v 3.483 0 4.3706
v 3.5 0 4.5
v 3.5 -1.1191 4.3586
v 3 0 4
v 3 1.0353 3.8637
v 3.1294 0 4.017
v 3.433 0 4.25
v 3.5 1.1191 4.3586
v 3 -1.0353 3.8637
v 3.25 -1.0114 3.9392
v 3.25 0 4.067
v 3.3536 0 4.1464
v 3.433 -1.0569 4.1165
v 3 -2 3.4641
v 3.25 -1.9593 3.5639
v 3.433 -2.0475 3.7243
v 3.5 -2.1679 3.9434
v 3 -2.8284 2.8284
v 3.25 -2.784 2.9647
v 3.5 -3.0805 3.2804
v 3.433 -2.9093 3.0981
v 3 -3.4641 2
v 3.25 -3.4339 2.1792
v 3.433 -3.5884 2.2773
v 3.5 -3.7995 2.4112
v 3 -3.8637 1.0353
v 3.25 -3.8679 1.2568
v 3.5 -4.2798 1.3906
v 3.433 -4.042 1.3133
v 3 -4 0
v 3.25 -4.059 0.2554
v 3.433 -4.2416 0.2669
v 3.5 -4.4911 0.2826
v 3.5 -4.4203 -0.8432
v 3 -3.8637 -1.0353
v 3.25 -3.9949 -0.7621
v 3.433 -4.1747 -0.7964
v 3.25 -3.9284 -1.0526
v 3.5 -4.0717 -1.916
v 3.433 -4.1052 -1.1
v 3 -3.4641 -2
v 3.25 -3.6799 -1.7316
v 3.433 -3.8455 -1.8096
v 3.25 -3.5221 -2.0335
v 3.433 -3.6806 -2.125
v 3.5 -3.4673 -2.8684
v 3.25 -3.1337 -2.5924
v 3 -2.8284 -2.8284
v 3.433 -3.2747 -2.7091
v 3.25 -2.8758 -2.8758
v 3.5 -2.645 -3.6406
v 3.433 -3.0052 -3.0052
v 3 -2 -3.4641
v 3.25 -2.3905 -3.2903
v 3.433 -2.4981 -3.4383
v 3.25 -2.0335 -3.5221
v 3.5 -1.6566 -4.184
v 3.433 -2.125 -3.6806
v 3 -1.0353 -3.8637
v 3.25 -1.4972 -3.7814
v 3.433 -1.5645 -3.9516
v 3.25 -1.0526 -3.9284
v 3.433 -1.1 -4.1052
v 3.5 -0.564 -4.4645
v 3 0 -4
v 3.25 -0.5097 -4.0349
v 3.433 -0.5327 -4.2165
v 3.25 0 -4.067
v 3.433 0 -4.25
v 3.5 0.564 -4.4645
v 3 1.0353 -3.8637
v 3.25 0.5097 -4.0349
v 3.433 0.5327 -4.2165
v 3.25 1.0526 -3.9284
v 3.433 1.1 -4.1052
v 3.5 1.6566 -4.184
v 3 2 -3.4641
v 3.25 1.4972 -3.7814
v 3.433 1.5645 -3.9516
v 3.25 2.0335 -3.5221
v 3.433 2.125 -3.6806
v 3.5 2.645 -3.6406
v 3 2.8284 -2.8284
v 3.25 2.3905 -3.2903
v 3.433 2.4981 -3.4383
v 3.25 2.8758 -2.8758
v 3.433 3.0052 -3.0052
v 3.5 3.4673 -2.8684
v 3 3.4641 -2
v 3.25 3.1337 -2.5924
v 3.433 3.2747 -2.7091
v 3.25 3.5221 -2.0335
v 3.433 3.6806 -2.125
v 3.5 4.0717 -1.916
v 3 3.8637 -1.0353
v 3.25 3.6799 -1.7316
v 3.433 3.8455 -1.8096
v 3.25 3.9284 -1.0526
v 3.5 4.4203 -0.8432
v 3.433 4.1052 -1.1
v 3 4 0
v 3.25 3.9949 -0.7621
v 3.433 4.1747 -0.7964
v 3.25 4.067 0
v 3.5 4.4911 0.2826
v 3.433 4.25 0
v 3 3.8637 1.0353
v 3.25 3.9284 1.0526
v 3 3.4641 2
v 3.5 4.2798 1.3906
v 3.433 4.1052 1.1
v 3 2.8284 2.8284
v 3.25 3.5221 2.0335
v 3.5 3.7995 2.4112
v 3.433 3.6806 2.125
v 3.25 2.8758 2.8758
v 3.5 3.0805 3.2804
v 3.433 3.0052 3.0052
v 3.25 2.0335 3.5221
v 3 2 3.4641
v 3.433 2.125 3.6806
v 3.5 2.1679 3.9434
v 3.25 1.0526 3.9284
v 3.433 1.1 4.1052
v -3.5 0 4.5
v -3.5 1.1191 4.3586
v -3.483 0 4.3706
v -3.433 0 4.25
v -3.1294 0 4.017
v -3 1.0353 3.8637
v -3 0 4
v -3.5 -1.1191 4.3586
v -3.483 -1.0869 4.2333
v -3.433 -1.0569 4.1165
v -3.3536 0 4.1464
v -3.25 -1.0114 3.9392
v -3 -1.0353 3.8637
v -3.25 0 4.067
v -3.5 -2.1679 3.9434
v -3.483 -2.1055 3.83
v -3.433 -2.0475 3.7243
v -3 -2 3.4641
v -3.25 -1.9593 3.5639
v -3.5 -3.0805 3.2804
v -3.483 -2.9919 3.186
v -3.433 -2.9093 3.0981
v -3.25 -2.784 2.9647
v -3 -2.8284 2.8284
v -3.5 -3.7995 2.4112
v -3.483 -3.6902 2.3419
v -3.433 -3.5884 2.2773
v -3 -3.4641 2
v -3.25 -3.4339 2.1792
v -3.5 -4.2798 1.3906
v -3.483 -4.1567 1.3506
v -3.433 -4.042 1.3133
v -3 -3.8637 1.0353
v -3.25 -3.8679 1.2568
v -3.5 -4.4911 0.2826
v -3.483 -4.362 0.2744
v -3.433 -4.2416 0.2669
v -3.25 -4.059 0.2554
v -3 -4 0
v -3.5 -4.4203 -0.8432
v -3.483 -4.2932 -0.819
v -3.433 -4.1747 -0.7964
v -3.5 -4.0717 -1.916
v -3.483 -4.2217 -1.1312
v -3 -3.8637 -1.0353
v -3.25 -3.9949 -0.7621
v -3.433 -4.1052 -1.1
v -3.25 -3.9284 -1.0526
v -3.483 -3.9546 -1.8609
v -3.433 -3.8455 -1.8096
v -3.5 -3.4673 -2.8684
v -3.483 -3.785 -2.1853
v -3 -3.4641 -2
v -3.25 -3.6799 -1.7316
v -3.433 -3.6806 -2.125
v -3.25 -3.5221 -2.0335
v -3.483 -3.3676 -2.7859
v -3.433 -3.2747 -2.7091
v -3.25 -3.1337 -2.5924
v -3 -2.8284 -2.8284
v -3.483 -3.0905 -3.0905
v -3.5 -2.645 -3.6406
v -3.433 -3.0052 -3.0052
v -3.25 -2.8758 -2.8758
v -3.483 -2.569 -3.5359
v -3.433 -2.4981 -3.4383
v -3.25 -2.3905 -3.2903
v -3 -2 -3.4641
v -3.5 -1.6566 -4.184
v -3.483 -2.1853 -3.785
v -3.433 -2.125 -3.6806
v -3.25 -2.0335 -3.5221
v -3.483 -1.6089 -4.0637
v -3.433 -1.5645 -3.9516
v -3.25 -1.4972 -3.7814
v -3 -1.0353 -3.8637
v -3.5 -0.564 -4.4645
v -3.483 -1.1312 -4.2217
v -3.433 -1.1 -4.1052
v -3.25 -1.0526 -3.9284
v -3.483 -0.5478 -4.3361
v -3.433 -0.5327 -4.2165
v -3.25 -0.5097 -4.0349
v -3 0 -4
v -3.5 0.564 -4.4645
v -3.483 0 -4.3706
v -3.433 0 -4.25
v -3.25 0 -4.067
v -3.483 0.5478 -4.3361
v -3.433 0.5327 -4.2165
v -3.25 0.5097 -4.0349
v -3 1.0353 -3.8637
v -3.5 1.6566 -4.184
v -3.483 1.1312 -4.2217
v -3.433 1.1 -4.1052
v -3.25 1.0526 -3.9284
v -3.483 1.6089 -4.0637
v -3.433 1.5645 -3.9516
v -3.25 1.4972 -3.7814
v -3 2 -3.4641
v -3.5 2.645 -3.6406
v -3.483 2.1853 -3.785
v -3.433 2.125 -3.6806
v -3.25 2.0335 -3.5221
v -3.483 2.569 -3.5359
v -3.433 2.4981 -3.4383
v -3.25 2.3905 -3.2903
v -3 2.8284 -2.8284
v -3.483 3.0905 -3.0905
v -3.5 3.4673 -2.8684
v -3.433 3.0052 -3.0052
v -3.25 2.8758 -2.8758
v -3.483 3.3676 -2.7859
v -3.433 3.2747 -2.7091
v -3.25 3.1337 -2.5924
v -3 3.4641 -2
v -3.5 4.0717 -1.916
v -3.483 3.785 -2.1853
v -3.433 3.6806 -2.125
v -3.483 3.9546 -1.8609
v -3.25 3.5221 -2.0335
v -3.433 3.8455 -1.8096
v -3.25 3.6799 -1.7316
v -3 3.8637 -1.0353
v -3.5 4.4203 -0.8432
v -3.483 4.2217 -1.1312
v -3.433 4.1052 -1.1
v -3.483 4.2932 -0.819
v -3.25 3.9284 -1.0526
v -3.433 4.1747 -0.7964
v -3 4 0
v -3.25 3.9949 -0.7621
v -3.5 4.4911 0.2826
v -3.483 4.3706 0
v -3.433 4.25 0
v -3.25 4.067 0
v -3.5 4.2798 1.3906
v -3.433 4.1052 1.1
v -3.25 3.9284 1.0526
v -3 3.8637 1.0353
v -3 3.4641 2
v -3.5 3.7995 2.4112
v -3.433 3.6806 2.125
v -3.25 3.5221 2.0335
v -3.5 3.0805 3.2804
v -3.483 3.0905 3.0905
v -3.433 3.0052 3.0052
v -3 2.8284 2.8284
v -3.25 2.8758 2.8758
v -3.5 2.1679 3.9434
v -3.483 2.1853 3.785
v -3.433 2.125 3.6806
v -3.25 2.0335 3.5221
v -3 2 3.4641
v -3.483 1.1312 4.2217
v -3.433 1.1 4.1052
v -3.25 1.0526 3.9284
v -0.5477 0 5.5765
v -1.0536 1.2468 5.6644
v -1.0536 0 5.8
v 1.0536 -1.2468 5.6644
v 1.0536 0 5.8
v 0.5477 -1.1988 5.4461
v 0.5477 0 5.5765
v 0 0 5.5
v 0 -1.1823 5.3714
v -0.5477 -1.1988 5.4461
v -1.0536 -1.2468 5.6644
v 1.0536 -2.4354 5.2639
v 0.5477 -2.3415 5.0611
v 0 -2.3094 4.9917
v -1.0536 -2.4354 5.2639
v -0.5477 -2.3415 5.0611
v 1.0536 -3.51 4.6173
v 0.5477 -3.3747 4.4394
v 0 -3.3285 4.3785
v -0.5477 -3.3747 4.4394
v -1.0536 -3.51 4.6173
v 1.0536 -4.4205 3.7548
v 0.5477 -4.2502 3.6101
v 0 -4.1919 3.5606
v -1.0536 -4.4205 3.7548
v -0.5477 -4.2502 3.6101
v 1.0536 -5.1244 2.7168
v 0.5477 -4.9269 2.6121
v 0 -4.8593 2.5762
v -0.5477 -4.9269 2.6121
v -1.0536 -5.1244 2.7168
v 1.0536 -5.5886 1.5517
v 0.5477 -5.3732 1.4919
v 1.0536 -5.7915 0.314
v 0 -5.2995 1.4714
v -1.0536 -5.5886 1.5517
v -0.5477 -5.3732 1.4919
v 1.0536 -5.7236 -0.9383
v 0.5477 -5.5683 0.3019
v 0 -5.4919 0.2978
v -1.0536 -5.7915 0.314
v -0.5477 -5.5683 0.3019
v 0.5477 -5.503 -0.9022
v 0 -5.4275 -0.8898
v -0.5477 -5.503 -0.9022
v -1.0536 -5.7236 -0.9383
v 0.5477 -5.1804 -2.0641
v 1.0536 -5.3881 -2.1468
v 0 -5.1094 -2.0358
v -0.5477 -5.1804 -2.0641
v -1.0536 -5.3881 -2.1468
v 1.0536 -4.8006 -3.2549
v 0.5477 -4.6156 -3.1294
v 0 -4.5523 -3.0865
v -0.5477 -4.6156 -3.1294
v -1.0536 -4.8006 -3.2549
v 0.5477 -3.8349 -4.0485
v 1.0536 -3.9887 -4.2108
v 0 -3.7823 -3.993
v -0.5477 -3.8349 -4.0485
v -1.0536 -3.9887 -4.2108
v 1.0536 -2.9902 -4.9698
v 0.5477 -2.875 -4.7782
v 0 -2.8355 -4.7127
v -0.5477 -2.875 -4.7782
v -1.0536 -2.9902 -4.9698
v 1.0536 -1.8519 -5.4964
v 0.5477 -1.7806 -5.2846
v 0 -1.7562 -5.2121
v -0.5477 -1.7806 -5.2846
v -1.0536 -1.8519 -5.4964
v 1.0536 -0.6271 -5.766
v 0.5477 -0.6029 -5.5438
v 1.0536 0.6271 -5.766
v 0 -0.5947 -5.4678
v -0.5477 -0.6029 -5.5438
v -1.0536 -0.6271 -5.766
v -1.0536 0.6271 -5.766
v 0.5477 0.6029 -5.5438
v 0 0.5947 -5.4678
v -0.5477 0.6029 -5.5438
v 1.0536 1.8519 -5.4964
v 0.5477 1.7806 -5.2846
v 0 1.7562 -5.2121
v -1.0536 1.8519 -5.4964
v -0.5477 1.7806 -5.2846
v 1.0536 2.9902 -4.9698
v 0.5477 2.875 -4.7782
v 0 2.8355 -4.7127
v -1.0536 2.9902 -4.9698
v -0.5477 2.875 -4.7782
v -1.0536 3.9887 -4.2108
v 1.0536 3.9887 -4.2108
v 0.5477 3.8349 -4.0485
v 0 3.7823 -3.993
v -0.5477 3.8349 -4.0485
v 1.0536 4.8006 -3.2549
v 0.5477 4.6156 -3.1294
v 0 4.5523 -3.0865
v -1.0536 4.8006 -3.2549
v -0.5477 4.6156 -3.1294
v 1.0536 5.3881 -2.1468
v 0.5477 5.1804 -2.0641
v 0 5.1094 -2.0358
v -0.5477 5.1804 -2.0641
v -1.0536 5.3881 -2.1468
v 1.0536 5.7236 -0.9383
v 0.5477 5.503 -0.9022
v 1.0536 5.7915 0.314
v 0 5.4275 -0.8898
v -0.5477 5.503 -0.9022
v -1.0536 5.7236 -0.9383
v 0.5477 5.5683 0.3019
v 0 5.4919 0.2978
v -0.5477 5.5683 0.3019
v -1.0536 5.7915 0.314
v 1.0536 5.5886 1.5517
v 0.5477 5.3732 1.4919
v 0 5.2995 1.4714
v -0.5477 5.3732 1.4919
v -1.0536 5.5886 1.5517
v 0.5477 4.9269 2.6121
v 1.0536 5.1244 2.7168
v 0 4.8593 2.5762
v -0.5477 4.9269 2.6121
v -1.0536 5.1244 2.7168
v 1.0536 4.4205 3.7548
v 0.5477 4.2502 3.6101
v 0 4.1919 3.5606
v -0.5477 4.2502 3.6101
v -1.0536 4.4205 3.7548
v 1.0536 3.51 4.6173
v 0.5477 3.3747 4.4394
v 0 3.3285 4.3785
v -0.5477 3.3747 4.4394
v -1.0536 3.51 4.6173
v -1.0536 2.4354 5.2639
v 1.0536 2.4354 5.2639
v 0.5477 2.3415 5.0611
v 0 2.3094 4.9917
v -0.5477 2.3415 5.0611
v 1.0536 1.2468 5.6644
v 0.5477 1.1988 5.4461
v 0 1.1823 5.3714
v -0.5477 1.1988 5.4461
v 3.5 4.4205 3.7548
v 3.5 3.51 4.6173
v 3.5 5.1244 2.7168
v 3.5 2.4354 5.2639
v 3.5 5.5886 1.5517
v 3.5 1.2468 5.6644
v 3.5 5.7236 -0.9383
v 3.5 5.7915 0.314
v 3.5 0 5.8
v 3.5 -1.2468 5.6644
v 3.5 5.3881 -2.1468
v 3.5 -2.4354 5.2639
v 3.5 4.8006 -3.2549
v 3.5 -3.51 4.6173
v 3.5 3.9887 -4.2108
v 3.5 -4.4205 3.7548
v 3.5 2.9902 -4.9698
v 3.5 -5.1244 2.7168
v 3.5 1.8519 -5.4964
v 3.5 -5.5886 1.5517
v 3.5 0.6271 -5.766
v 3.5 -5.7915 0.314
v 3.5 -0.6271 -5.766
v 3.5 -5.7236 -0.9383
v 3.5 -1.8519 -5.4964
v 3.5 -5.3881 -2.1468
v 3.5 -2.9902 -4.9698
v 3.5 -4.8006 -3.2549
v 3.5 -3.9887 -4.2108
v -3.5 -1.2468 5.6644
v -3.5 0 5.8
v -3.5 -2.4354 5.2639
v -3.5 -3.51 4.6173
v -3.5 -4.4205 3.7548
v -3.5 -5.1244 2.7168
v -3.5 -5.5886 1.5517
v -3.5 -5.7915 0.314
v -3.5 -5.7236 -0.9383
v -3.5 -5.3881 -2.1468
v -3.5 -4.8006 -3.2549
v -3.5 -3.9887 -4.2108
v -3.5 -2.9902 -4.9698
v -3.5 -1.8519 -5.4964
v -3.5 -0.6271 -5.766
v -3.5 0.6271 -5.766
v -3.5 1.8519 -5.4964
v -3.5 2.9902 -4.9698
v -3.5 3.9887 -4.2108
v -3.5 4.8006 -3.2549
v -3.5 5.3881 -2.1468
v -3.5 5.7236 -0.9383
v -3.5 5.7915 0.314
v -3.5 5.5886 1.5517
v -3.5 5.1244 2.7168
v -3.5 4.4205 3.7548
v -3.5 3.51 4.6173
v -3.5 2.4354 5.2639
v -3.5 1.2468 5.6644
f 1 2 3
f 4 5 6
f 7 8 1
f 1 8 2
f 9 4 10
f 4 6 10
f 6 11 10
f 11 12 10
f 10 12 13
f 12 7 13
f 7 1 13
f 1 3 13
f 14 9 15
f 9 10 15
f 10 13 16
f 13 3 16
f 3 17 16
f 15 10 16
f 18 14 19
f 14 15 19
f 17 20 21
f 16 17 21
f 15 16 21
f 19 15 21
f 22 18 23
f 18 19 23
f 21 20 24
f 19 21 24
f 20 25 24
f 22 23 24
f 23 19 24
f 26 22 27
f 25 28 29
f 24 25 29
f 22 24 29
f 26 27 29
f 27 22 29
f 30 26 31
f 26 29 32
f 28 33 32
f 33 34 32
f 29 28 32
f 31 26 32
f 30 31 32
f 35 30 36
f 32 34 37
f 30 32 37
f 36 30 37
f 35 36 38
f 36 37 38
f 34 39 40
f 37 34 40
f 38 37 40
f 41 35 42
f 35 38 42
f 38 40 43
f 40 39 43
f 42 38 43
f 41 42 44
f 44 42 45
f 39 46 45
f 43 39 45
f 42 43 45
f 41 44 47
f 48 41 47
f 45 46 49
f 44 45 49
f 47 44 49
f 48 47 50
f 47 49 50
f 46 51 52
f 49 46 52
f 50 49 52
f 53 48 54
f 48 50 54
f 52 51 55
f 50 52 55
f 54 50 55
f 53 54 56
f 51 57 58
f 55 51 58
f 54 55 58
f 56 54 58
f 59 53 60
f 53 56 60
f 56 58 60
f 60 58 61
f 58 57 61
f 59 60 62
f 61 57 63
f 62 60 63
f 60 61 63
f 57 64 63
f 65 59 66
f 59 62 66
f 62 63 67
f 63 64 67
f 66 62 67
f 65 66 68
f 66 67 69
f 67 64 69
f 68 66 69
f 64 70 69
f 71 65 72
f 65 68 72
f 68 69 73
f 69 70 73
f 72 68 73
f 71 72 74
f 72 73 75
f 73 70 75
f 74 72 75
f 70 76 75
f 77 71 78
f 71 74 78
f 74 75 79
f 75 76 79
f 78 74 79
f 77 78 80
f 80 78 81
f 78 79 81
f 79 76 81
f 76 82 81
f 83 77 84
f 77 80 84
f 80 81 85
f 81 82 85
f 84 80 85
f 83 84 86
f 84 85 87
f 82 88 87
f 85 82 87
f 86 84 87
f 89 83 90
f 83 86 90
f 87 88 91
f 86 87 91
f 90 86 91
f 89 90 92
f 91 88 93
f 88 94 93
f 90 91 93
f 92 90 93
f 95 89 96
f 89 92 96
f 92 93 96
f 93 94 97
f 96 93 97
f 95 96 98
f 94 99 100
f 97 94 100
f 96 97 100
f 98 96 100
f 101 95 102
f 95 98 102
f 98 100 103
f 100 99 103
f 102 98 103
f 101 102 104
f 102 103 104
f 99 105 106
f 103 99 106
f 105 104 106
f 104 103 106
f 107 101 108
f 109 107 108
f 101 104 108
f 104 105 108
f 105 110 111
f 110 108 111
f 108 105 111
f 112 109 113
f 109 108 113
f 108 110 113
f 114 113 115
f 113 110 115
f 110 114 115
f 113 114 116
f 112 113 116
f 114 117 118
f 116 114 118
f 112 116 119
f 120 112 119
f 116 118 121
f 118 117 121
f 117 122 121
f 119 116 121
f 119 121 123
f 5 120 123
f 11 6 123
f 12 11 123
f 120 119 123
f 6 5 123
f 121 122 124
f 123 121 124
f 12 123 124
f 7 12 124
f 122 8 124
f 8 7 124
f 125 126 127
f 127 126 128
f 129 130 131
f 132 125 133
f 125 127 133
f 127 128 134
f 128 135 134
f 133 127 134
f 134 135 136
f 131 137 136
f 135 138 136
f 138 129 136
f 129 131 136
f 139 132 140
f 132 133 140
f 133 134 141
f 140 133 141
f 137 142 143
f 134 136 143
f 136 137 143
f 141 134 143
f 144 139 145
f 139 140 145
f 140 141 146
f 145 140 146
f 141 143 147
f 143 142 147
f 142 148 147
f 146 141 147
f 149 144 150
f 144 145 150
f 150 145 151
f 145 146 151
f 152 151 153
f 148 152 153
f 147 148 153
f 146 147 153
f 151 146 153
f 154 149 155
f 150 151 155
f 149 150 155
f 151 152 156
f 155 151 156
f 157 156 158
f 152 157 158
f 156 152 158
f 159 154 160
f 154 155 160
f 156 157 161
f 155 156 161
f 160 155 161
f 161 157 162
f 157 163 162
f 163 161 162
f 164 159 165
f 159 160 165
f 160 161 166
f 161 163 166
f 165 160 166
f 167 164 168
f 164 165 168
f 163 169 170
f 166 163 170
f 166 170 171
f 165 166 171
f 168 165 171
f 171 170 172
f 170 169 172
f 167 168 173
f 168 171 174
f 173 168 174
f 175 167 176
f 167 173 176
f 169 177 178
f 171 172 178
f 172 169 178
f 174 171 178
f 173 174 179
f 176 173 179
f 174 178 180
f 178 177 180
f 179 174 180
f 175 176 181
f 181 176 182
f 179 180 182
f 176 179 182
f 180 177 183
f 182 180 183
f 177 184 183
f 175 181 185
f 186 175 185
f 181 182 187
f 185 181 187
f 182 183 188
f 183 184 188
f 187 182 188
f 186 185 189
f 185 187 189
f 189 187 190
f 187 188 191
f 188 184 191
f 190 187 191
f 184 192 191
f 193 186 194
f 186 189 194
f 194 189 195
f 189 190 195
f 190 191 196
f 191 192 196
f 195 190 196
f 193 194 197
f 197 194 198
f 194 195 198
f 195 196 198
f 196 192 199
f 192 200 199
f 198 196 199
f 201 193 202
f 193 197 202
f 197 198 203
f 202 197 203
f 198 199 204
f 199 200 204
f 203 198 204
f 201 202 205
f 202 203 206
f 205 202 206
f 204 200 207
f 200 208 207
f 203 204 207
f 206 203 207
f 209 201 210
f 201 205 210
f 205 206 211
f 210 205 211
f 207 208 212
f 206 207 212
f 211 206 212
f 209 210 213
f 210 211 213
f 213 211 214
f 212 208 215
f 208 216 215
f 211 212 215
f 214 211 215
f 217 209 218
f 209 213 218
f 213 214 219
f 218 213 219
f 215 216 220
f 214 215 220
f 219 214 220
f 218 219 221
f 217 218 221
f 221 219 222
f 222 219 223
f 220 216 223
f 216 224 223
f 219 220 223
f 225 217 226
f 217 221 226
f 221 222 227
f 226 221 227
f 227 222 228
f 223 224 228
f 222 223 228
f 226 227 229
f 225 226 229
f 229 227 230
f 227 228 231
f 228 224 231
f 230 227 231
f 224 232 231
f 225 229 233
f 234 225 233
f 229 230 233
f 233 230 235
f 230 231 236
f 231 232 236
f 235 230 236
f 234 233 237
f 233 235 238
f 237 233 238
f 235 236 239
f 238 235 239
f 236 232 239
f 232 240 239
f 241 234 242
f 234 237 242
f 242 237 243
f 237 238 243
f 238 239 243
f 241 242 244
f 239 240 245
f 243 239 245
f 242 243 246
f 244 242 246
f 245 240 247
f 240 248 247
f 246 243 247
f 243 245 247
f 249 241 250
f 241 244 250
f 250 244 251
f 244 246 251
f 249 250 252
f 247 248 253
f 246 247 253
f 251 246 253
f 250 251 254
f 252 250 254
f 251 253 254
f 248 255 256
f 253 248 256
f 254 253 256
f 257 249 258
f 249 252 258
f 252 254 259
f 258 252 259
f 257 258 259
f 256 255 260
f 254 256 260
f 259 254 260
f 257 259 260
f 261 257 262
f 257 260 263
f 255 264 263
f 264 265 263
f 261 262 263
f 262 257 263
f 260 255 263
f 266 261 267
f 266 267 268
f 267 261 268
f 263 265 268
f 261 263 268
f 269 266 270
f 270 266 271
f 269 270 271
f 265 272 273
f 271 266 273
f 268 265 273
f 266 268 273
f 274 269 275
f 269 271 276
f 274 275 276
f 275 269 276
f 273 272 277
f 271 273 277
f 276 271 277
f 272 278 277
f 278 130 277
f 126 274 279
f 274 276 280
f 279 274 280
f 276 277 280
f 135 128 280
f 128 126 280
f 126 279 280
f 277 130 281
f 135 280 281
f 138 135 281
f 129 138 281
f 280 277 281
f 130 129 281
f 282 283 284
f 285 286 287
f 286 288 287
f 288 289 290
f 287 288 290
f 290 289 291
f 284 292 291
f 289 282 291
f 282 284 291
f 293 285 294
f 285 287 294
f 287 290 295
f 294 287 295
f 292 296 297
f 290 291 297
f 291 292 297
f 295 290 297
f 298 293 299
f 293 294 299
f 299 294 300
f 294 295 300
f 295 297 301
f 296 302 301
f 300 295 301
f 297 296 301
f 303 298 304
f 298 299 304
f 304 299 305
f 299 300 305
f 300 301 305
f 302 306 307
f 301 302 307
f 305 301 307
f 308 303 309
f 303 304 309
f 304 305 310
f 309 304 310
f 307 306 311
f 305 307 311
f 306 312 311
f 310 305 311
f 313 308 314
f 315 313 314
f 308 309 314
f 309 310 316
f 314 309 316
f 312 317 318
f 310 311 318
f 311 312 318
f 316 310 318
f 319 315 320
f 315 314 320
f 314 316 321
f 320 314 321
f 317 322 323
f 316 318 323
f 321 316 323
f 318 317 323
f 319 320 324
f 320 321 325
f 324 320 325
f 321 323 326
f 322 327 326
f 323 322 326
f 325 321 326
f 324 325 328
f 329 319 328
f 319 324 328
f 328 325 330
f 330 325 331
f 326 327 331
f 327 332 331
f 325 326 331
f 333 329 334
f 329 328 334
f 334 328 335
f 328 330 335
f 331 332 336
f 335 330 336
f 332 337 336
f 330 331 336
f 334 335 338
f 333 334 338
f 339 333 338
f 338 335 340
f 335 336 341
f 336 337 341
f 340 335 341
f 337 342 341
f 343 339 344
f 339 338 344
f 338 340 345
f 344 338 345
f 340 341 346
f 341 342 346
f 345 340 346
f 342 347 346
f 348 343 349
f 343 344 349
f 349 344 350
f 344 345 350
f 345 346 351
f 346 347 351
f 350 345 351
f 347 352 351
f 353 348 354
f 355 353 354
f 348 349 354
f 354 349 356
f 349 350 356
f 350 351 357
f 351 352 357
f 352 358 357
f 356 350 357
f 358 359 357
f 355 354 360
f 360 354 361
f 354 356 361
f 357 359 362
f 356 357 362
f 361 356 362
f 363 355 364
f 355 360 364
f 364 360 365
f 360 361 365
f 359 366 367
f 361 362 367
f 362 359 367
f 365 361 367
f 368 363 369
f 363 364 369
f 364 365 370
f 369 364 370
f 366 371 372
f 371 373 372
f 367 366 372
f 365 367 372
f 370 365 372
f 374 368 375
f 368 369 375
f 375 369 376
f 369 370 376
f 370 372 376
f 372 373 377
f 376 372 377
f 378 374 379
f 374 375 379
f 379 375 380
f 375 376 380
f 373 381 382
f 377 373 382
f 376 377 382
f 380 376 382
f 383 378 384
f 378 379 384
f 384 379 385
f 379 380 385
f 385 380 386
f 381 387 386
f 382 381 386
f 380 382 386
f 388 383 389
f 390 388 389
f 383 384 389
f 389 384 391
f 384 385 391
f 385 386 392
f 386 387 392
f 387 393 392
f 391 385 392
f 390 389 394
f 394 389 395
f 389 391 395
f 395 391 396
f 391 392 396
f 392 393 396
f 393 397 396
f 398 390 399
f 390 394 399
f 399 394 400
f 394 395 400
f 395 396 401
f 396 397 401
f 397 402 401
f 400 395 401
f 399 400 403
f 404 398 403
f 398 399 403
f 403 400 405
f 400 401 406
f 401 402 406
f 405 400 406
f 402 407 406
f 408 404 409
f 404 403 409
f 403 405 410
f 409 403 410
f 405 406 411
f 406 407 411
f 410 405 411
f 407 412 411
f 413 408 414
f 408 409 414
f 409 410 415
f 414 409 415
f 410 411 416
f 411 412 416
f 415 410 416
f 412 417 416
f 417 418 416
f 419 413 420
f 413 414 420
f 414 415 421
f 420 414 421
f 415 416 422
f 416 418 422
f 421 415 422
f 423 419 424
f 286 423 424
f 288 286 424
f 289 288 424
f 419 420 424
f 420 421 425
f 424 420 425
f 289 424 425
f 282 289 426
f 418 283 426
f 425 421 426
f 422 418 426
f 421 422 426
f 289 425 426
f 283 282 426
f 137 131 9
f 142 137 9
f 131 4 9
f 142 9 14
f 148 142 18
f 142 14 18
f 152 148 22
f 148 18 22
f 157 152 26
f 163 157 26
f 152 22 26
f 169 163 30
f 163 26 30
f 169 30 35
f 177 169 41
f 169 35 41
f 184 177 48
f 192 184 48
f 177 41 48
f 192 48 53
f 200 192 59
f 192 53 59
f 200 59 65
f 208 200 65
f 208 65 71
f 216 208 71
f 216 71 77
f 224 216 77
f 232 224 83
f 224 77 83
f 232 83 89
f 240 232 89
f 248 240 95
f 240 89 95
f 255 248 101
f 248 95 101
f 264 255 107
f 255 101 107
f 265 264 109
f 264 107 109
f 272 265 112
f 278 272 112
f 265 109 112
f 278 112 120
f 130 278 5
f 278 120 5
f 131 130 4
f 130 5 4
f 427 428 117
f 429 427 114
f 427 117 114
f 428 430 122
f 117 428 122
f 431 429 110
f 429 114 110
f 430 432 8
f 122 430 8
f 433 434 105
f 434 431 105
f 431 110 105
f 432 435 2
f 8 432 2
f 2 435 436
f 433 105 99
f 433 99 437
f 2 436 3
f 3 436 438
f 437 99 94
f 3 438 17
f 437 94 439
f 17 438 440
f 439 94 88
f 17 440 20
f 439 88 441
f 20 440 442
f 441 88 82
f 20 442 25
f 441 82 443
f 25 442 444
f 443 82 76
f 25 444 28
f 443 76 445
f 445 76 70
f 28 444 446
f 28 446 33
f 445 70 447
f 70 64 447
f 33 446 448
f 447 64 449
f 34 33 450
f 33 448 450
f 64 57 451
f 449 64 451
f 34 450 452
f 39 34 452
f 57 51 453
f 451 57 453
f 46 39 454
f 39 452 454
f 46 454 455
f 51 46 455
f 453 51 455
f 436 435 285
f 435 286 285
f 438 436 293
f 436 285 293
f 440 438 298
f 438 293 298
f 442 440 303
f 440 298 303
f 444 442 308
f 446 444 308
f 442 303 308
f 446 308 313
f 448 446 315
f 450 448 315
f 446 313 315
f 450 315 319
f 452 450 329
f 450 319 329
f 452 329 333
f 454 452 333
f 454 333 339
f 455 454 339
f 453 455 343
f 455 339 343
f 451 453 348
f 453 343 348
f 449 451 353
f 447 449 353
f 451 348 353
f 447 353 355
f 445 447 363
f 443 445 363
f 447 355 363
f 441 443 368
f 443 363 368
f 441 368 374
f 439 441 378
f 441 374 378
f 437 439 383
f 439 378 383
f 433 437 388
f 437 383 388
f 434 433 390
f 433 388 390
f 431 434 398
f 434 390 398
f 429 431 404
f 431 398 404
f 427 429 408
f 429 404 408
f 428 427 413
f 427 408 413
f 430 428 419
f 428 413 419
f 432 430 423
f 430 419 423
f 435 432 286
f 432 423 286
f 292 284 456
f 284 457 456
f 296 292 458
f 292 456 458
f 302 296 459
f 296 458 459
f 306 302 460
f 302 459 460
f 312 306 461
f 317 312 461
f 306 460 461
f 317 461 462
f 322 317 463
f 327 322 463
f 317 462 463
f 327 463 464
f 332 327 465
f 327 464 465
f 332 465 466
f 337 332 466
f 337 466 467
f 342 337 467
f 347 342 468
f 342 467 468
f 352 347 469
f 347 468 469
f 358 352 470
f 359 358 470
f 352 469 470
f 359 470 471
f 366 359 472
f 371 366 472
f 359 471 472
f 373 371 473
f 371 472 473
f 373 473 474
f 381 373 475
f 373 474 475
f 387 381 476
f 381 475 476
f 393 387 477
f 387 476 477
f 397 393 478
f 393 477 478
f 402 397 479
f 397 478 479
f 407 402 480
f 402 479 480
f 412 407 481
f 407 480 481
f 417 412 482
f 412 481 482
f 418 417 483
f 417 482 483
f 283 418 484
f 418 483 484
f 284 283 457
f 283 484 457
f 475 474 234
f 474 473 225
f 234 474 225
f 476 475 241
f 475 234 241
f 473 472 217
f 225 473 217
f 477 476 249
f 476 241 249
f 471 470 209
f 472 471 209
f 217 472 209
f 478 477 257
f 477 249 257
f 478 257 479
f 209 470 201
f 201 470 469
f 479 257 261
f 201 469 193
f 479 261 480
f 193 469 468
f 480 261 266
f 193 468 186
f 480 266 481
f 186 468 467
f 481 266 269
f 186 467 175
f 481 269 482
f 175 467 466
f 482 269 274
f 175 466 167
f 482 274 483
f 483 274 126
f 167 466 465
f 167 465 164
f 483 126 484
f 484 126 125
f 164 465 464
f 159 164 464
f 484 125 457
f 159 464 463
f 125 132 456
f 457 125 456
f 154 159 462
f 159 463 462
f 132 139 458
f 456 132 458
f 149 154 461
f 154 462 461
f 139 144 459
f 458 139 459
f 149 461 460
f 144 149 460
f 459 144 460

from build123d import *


with BuildPart() as part:
    # Esquisse1 → Base-Révolution (revolve)
    with BuildSketch(Plane.XY, mode=Mode.PRIVATE) as base_r_volution_sk:
        with BuildLine():
            Line((3.5, 4.5), (3.5, 5.8))
            Line((3.5, 5.8), (1.053565375, 5.8))
            ThreePointArc((1.053565375, 5.8), (0, 5.5), (-1.053565375, 5.8))
            Line((-1.053565375, 5.8), (-3.5, 5.8))
            Line((-3.5, 5.8), (-3.5, 4.5))
            ThreePointArc((-3.5, 4.5), (-3.353553391, 4.146446609), (-3, 4))
            Line((-3, 4), (3, 4))
            ThreePointArc((3, 4), (3.353553391, 4.146446609), (3.5, 4.5))
        make_face()
    revolve(base_r_volution_sk.sketch.rotate(Axis((-4.370908092, 0, 0), (1, 0, 0)), 90), axis=Axis((-4.370908092, 0, 0), (1, 0, 0)))


solid = part.part
